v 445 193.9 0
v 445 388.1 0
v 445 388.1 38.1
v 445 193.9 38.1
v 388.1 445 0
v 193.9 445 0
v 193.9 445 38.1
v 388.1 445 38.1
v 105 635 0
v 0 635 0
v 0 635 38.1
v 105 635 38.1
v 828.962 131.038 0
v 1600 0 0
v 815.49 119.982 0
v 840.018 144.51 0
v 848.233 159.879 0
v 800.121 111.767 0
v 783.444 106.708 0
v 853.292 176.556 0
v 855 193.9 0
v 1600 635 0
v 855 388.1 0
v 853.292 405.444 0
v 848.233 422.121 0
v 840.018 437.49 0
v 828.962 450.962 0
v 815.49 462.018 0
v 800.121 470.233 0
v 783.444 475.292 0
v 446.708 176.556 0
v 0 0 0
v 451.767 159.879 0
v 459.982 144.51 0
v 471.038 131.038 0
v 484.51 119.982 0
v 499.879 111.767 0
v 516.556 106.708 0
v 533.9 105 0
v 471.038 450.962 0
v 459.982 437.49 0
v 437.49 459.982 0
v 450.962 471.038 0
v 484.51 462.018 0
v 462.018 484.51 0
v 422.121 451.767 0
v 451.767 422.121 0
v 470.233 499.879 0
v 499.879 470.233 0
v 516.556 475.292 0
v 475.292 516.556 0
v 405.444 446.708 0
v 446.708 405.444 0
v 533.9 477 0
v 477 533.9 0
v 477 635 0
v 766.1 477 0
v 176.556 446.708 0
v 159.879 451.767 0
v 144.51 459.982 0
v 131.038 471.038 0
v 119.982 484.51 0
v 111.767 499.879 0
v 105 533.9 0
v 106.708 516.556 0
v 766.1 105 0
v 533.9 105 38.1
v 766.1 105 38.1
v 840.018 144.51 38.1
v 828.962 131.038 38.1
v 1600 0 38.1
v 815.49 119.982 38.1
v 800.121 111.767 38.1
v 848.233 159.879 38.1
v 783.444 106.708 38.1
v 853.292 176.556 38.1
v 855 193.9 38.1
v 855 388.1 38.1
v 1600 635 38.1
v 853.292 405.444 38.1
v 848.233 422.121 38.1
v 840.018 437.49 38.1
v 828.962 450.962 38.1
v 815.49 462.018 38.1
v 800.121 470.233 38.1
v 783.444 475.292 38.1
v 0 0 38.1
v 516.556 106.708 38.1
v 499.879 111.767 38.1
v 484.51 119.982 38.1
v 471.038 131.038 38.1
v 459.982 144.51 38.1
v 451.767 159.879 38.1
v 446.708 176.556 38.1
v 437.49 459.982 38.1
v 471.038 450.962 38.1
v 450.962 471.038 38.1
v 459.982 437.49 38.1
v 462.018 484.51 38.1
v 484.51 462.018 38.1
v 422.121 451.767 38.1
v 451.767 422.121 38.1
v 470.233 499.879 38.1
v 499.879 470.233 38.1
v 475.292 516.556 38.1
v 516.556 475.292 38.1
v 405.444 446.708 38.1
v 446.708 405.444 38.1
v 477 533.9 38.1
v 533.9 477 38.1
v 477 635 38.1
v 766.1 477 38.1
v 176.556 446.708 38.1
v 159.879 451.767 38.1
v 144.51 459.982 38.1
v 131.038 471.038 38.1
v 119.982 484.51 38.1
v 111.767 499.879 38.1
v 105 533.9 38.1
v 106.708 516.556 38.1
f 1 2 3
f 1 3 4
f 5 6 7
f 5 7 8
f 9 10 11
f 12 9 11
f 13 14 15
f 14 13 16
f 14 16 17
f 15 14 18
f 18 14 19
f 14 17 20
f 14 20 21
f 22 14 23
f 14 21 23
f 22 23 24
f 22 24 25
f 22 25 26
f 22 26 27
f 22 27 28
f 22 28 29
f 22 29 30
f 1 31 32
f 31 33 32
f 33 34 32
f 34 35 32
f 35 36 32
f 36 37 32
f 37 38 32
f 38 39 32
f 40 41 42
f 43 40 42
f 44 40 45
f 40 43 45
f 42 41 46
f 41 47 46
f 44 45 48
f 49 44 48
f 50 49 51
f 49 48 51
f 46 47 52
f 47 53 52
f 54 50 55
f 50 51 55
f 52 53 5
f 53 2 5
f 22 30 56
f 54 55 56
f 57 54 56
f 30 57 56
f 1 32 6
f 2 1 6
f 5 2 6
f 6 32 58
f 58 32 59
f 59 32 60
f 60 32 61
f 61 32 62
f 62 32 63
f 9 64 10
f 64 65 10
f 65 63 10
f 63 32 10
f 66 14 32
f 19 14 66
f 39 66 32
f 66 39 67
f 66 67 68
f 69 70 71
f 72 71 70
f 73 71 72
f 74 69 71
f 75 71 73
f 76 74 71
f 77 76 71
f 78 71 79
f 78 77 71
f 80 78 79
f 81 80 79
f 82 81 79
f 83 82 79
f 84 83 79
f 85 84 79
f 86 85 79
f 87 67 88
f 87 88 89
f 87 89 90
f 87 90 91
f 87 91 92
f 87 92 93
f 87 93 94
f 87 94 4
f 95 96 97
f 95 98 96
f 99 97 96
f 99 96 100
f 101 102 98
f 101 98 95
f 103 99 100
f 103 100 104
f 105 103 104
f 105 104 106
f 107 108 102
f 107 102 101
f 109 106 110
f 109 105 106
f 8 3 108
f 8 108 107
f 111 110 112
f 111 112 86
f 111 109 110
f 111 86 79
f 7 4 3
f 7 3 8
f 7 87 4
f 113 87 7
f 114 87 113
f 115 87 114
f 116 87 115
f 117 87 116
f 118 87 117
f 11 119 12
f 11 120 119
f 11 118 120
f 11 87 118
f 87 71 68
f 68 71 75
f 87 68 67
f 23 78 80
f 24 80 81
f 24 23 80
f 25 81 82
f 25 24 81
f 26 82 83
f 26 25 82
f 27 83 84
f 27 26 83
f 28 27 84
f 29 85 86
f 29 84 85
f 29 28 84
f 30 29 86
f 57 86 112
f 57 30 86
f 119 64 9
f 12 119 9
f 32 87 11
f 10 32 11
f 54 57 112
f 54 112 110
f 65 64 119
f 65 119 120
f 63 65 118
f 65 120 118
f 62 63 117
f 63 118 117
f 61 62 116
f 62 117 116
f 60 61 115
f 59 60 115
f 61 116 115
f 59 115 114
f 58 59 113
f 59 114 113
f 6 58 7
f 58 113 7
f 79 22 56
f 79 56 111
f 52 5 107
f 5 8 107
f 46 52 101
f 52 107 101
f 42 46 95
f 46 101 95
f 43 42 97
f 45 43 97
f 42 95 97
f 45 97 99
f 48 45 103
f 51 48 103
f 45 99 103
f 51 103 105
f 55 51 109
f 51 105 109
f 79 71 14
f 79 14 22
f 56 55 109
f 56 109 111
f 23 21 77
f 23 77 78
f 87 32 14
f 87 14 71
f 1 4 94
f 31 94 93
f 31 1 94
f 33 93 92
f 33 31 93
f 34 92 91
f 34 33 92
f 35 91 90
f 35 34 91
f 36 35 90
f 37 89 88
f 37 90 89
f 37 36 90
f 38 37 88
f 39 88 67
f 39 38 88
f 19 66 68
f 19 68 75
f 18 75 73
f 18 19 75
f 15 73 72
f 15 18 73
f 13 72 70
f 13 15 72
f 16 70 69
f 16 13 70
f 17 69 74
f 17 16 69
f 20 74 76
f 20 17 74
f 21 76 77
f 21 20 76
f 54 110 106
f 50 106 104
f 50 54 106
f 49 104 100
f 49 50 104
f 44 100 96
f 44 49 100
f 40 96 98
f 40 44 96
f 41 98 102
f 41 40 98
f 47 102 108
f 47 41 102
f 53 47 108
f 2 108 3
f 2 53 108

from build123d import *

# Parameters (mm, degrees)
F0_W     = 635
F0_H     = 38.1
F1_DEPTH = 1600
F2_W     = 372
F2_H     = 190
F3_DEPTH = 38.101
F4_R     = 88.9
F6_DEPTH = 38.101


with BuildPart() as f1:
    # F0 (on Right) → F1 (new body)
    with BuildSketch(Plane.YZ):
        with Locations((317.5, 19.05)):
            Rectangle(F0_W, F0_H)
    extrude(amount=F1_DEPTH)

    # F2 (on Top) → F3 (cut, through all)
    with BuildSketch(Plane.XY):
        with Locations((291, 540)):
            Rectangle(F2_W, F2_H)
    extrude(amount=F3_DEPTH, mode=Mode.SUBTRACT)

    # F4
    f4_edges = [f1.edges().sort_by_distance(p)[0] for p in [
        (477, 445, 19.05),
        (105, 445, 19.05),
    ]]
    fillet(f4_edges, radius=F4_R)

    # F5 (on Top) → F6 (cut, through all)
    with BuildSketch(Plane.XY):
        with BuildLine():
            Line((533.9, 105), (766.1, 105))
            ThreePointArc((766.1, 105), (828.961793, 131.038207), (855, 193.9))
            Line((855, 193.9), (855, 388.1))
            ThreePointArc((855, 388.1), (828.961793, 450.961793), (766.1, 477))
            Line((766.1, 477), (533.9, 477))
            ThreePointArc((533.9, 477), (471.038207, 450.961793), (445, 388.1))
            Line((445, 388.1), (445, 193.9))
            ThreePointArc((445, 193.9), (471.038207, 131.038207), (533.9, 105))
        make_face()
    extrude(amount=F6_DEPTH, mode=Mode.SUBTRACT)


solid = f1.part
